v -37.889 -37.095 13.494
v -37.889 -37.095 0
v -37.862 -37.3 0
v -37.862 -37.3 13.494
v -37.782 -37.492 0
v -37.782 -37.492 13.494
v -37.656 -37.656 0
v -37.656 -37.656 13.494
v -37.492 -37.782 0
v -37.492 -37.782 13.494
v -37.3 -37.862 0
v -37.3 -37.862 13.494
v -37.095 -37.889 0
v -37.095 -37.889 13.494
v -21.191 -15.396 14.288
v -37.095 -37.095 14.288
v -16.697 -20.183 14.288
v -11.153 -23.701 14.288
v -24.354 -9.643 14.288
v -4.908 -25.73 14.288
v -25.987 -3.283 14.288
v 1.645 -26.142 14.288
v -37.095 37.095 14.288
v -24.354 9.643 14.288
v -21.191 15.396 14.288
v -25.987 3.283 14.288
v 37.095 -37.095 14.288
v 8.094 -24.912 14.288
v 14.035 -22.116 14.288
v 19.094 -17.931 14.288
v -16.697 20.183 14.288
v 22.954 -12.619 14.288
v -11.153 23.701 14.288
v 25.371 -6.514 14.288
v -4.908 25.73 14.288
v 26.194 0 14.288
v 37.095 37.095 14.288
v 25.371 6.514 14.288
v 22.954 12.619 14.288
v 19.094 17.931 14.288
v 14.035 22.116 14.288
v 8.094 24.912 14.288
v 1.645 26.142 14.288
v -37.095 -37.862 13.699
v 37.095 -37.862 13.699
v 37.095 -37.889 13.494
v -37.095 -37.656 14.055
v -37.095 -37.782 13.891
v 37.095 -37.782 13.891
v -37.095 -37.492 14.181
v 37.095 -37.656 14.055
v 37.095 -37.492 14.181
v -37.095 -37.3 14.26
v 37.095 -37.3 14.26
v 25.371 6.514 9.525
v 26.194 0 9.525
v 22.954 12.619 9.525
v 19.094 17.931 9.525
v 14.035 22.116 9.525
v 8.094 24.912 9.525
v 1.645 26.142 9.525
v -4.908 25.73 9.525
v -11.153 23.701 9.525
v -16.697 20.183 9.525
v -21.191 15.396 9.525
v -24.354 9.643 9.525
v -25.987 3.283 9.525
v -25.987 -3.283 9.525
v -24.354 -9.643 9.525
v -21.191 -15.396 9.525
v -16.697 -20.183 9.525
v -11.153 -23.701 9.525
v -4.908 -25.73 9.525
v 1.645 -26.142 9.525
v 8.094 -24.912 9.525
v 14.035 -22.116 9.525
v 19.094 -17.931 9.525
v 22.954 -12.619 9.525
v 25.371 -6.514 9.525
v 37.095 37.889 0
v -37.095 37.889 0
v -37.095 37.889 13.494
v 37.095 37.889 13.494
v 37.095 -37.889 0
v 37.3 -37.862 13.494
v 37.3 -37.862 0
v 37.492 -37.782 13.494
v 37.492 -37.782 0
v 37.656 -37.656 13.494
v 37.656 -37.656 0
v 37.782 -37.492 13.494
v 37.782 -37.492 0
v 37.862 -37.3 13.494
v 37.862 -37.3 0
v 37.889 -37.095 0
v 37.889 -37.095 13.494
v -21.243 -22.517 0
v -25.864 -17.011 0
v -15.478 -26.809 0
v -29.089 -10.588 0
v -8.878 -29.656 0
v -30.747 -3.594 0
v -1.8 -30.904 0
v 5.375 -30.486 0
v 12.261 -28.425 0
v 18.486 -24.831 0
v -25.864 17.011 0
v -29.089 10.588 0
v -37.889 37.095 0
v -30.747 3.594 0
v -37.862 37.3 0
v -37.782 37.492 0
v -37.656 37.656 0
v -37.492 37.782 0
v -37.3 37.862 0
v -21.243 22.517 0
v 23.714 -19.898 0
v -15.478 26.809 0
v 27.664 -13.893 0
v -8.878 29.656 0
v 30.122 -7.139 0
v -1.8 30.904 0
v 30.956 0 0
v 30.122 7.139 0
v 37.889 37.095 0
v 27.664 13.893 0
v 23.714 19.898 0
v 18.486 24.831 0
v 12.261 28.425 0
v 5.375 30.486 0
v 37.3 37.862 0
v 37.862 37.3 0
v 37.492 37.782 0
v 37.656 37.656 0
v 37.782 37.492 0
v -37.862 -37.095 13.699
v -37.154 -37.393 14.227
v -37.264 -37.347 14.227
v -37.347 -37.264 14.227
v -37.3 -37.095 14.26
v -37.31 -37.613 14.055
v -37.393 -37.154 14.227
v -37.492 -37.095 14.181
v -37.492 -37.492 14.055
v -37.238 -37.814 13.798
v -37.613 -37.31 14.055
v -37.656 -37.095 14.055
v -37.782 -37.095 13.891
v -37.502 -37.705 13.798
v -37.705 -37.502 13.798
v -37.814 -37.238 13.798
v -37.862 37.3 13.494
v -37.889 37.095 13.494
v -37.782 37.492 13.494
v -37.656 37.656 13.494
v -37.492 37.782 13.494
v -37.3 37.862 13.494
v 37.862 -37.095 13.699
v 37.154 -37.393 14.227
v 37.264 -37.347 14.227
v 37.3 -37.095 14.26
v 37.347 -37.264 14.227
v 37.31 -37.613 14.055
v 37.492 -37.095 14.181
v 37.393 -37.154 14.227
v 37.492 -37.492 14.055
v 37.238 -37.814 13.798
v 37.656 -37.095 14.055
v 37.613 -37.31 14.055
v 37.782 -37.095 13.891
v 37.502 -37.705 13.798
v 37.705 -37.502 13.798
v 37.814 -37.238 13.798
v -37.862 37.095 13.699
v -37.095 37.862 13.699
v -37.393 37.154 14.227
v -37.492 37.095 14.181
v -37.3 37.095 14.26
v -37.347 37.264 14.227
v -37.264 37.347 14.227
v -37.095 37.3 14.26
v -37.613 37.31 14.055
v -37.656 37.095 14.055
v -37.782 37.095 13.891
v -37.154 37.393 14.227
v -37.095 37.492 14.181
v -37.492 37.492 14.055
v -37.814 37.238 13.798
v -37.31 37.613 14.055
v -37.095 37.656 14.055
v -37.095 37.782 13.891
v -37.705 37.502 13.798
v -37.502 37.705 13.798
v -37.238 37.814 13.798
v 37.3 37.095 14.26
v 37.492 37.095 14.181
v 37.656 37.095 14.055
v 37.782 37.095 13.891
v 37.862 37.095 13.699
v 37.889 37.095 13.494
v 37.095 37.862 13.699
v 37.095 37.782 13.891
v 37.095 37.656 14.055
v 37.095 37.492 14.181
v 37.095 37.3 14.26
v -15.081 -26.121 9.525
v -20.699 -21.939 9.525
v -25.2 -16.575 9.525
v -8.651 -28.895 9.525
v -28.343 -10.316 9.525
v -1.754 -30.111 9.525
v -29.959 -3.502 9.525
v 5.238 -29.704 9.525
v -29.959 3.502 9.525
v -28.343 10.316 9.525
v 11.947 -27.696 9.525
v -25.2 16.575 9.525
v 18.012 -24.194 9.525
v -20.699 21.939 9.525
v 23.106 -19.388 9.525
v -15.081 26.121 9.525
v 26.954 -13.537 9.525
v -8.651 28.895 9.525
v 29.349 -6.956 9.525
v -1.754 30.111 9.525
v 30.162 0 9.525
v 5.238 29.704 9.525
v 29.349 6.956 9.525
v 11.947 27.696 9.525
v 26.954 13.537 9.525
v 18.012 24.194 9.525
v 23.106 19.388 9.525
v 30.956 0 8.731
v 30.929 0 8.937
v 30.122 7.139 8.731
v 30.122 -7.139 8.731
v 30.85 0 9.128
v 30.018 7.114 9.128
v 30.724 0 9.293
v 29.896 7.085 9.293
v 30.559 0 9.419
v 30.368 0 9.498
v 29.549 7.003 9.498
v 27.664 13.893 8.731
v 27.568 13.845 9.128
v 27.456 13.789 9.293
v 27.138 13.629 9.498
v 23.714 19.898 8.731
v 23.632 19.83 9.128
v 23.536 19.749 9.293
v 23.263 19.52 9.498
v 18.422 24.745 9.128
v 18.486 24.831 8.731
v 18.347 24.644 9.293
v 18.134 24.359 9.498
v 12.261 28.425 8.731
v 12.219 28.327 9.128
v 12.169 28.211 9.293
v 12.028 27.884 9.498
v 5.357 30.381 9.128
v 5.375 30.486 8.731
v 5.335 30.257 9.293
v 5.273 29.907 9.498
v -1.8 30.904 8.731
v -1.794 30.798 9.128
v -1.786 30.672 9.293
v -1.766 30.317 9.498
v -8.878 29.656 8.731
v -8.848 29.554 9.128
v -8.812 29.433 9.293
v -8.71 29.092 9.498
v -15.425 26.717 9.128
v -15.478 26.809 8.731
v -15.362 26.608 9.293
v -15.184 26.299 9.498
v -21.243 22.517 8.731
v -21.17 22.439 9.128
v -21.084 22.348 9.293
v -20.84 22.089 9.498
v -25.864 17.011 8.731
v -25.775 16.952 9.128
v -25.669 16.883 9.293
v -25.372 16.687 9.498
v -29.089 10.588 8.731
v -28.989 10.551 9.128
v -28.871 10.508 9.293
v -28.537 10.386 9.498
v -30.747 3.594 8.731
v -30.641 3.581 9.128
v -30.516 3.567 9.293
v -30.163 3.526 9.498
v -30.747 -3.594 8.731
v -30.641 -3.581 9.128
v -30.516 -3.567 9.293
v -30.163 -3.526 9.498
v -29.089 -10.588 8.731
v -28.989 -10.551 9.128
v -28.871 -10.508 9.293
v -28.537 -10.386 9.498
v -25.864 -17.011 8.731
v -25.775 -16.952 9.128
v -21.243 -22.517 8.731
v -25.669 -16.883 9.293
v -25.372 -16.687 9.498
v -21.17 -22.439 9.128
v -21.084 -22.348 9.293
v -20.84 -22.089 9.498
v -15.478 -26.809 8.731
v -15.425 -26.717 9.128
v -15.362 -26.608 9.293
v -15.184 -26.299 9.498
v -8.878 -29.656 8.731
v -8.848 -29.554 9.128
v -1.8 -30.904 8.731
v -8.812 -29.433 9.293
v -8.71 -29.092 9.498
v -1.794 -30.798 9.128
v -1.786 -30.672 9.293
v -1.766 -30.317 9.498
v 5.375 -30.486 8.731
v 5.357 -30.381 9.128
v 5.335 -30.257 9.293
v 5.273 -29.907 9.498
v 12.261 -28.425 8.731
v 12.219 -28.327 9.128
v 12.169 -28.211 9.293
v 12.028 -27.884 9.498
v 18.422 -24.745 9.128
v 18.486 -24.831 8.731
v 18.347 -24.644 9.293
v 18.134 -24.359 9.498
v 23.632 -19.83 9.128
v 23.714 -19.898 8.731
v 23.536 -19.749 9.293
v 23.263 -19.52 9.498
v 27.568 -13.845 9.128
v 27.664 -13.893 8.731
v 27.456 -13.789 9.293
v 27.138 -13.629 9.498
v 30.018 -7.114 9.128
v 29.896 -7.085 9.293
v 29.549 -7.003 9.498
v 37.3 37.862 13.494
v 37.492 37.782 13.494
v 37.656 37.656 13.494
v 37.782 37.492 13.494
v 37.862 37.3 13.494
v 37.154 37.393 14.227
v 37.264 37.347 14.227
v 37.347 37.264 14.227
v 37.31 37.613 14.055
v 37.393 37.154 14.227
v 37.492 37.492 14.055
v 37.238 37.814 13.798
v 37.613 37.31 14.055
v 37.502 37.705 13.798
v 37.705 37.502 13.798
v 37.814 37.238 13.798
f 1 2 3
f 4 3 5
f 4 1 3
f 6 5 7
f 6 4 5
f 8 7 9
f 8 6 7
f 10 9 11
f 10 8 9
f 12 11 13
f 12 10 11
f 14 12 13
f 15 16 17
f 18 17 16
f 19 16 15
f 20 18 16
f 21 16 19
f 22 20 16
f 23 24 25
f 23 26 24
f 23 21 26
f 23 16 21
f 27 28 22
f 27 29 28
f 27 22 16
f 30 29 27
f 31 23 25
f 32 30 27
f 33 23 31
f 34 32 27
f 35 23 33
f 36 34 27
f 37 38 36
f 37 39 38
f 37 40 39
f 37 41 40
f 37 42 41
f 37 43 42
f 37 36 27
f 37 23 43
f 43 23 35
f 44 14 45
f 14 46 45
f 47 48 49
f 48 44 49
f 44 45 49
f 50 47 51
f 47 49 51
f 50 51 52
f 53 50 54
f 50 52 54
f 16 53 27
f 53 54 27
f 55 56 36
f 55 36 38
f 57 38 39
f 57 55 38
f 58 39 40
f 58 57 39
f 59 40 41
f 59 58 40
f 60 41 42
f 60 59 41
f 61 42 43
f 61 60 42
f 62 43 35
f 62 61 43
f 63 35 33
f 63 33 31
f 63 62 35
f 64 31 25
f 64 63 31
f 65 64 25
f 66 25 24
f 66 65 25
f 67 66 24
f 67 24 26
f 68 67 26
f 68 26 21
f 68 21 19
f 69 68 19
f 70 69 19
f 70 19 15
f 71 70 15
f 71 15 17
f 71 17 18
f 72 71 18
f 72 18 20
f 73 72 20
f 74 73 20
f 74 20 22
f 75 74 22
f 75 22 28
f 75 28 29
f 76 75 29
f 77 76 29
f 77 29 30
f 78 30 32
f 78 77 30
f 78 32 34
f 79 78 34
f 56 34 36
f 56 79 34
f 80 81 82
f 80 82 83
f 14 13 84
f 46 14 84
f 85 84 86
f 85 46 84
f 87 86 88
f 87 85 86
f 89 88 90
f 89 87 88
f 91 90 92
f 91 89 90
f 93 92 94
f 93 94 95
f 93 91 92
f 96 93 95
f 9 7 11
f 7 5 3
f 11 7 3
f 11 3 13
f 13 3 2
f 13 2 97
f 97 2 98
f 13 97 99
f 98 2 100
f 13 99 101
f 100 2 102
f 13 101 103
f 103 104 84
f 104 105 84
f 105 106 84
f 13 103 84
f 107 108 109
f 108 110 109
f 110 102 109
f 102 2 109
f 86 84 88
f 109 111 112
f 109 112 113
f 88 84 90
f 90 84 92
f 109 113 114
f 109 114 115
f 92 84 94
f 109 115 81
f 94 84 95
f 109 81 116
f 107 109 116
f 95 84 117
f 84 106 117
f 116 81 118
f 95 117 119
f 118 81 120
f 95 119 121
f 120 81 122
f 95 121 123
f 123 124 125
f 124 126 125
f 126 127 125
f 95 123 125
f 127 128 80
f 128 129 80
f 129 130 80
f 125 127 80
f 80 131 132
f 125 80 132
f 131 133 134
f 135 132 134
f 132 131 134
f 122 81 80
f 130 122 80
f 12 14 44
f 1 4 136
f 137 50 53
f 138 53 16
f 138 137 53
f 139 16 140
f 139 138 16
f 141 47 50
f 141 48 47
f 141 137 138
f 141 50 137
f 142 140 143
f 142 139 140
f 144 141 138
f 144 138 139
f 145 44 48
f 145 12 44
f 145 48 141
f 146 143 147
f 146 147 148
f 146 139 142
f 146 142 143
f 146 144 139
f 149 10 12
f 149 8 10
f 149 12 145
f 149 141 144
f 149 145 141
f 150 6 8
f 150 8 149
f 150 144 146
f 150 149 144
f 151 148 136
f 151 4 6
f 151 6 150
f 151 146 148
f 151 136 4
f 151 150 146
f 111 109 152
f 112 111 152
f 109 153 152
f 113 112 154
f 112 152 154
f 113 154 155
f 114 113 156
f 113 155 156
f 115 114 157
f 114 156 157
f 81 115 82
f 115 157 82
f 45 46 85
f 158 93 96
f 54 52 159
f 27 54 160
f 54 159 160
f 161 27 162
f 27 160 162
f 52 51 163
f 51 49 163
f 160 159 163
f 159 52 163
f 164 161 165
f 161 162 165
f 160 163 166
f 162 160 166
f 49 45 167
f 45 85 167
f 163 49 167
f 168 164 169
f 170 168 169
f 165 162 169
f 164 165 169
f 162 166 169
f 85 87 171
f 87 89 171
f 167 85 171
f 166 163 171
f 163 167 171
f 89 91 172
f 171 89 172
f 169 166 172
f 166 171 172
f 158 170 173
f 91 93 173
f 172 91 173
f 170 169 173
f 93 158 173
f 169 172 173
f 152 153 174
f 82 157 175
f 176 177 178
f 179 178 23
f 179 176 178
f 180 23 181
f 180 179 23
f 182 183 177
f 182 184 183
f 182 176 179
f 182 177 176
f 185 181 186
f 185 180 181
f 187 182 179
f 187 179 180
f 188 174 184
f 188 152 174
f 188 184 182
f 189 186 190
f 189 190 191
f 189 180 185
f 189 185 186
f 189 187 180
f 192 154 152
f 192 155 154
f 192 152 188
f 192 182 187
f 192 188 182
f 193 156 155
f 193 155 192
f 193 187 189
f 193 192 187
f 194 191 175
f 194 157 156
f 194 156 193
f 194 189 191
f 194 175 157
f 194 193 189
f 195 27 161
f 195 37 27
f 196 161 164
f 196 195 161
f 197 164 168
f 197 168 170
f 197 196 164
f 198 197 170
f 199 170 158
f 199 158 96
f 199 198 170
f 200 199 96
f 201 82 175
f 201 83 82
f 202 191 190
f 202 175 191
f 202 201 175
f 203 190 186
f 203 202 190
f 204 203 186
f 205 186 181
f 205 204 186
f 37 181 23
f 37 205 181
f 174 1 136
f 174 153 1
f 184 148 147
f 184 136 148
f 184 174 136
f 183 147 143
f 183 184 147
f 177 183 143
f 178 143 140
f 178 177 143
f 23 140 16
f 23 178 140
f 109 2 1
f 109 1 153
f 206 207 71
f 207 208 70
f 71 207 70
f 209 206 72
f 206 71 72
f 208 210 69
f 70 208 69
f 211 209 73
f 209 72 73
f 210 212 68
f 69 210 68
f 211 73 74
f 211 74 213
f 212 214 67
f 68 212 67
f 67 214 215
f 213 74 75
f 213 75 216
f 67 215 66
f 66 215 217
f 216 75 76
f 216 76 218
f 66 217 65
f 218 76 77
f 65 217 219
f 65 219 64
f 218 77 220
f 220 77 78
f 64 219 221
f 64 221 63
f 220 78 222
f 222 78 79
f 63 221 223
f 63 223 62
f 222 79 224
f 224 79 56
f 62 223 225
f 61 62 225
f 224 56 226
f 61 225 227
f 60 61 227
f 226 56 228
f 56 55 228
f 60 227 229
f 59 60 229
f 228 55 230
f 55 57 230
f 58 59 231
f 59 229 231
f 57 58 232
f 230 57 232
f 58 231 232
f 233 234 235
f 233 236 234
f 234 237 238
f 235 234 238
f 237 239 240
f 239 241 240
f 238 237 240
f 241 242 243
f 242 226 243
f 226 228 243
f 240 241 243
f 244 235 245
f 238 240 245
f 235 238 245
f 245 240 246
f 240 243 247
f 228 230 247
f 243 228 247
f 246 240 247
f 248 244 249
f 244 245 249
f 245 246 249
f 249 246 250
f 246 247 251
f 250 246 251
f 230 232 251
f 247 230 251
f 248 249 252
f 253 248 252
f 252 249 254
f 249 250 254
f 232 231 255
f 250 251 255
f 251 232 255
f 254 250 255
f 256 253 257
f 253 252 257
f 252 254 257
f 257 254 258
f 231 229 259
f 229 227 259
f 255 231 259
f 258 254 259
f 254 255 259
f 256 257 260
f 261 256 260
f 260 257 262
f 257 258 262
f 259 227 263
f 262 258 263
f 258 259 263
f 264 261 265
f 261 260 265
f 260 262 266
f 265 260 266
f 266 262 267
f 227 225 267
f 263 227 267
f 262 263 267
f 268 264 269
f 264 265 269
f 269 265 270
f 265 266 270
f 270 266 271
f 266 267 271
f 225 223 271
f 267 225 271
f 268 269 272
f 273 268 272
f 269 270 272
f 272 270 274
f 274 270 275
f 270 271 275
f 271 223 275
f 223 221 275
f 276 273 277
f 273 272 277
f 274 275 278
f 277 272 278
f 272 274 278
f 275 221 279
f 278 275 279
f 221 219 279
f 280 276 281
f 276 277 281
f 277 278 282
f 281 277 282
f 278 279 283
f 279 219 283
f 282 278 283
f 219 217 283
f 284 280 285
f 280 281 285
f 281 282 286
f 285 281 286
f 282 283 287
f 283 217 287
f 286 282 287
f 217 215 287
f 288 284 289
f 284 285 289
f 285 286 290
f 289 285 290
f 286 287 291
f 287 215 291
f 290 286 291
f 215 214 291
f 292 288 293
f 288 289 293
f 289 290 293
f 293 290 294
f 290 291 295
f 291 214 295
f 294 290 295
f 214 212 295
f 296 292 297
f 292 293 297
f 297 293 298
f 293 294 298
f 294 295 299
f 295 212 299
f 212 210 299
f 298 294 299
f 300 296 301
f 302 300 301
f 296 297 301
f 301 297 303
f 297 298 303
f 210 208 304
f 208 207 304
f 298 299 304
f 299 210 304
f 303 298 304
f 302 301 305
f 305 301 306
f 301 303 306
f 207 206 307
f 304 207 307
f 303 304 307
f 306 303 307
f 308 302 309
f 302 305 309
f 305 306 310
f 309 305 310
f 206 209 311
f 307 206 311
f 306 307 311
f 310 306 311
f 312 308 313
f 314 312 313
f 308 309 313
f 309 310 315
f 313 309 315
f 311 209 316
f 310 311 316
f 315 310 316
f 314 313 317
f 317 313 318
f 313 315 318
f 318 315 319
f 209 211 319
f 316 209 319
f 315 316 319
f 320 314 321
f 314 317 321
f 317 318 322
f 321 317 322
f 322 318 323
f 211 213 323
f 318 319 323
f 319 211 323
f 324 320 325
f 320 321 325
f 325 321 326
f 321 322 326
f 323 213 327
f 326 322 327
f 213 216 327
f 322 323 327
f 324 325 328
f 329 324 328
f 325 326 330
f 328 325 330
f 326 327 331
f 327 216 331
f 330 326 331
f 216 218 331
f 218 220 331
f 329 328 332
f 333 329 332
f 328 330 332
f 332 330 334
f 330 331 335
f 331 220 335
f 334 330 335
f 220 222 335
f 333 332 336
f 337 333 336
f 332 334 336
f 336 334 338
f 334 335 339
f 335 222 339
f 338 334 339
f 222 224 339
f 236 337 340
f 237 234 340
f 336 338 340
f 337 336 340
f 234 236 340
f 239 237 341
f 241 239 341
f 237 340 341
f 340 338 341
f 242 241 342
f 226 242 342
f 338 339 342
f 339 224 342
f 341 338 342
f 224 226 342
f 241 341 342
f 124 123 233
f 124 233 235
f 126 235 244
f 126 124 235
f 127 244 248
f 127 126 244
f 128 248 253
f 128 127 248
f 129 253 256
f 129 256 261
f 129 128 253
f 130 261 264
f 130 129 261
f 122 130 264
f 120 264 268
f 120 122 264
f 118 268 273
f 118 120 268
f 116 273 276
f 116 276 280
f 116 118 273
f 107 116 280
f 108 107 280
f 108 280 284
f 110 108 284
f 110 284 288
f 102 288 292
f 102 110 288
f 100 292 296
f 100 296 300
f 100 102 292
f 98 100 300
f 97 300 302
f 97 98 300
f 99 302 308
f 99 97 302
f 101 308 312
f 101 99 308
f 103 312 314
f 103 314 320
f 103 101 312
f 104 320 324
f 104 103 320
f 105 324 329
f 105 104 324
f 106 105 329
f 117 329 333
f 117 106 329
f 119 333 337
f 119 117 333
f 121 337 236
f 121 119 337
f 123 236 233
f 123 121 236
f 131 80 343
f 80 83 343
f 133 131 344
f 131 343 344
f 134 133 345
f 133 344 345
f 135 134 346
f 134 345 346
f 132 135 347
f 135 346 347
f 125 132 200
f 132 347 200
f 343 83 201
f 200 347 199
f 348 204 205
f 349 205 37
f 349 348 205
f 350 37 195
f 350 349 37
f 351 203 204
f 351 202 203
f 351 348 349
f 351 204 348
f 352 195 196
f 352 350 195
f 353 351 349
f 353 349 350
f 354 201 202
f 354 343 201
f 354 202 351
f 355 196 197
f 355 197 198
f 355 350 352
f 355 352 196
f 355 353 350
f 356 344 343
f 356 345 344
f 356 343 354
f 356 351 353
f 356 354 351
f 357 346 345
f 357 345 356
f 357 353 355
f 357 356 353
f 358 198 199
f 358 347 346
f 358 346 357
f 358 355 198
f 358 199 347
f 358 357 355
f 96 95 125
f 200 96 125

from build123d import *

# Parameters (mm, degrees)
F0_W     = 75.777124
F0_H     = 75.777124
F0_R     = 26.19375
F1_DEPTH = 14.2875
F2_R     = 30.95625
F3_DEPTH = 9.525
F4_R     = 0.79375


with BuildPart() as f1:
    # F0 (on Top) → F1 (new body)
    with BuildSketch(Plane.XY):
        Rectangle(F0_W, F0_H)
        Circle(F0_R, mode=Mode.SUBTRACT)
    extrude(amount=F1_DEPTH)

    # F2 (on Top) → F3 (cut)
    with BuildSketch(Plane.XY):
        Circle(F2_R)
    extrude(amount=F3_DEPTH, mode=Mode.SUBTRACT)

    # F4
    f4_edges = [f1.edges().sort_by_distance(p)[0] for p in [
        (-30.95625, 0, 9.525),
        (-37.888562, -37.888562, 7.14375),
        (37.888562, -37.888562, 7.14375),
        (37.888562, 37.888562, 7.14375),
        (-37.888562, 37.888562, 7.14375),
        (0, -37.888562, 14.2875),
        (-37.888562, 0, 14.2875),
        (0, 37.888562, 14.2875),
        (37.888562, 0, 14.2875),
    ]]
    fillet(f4_edges, radius=F4_R)


solid = f1.part
